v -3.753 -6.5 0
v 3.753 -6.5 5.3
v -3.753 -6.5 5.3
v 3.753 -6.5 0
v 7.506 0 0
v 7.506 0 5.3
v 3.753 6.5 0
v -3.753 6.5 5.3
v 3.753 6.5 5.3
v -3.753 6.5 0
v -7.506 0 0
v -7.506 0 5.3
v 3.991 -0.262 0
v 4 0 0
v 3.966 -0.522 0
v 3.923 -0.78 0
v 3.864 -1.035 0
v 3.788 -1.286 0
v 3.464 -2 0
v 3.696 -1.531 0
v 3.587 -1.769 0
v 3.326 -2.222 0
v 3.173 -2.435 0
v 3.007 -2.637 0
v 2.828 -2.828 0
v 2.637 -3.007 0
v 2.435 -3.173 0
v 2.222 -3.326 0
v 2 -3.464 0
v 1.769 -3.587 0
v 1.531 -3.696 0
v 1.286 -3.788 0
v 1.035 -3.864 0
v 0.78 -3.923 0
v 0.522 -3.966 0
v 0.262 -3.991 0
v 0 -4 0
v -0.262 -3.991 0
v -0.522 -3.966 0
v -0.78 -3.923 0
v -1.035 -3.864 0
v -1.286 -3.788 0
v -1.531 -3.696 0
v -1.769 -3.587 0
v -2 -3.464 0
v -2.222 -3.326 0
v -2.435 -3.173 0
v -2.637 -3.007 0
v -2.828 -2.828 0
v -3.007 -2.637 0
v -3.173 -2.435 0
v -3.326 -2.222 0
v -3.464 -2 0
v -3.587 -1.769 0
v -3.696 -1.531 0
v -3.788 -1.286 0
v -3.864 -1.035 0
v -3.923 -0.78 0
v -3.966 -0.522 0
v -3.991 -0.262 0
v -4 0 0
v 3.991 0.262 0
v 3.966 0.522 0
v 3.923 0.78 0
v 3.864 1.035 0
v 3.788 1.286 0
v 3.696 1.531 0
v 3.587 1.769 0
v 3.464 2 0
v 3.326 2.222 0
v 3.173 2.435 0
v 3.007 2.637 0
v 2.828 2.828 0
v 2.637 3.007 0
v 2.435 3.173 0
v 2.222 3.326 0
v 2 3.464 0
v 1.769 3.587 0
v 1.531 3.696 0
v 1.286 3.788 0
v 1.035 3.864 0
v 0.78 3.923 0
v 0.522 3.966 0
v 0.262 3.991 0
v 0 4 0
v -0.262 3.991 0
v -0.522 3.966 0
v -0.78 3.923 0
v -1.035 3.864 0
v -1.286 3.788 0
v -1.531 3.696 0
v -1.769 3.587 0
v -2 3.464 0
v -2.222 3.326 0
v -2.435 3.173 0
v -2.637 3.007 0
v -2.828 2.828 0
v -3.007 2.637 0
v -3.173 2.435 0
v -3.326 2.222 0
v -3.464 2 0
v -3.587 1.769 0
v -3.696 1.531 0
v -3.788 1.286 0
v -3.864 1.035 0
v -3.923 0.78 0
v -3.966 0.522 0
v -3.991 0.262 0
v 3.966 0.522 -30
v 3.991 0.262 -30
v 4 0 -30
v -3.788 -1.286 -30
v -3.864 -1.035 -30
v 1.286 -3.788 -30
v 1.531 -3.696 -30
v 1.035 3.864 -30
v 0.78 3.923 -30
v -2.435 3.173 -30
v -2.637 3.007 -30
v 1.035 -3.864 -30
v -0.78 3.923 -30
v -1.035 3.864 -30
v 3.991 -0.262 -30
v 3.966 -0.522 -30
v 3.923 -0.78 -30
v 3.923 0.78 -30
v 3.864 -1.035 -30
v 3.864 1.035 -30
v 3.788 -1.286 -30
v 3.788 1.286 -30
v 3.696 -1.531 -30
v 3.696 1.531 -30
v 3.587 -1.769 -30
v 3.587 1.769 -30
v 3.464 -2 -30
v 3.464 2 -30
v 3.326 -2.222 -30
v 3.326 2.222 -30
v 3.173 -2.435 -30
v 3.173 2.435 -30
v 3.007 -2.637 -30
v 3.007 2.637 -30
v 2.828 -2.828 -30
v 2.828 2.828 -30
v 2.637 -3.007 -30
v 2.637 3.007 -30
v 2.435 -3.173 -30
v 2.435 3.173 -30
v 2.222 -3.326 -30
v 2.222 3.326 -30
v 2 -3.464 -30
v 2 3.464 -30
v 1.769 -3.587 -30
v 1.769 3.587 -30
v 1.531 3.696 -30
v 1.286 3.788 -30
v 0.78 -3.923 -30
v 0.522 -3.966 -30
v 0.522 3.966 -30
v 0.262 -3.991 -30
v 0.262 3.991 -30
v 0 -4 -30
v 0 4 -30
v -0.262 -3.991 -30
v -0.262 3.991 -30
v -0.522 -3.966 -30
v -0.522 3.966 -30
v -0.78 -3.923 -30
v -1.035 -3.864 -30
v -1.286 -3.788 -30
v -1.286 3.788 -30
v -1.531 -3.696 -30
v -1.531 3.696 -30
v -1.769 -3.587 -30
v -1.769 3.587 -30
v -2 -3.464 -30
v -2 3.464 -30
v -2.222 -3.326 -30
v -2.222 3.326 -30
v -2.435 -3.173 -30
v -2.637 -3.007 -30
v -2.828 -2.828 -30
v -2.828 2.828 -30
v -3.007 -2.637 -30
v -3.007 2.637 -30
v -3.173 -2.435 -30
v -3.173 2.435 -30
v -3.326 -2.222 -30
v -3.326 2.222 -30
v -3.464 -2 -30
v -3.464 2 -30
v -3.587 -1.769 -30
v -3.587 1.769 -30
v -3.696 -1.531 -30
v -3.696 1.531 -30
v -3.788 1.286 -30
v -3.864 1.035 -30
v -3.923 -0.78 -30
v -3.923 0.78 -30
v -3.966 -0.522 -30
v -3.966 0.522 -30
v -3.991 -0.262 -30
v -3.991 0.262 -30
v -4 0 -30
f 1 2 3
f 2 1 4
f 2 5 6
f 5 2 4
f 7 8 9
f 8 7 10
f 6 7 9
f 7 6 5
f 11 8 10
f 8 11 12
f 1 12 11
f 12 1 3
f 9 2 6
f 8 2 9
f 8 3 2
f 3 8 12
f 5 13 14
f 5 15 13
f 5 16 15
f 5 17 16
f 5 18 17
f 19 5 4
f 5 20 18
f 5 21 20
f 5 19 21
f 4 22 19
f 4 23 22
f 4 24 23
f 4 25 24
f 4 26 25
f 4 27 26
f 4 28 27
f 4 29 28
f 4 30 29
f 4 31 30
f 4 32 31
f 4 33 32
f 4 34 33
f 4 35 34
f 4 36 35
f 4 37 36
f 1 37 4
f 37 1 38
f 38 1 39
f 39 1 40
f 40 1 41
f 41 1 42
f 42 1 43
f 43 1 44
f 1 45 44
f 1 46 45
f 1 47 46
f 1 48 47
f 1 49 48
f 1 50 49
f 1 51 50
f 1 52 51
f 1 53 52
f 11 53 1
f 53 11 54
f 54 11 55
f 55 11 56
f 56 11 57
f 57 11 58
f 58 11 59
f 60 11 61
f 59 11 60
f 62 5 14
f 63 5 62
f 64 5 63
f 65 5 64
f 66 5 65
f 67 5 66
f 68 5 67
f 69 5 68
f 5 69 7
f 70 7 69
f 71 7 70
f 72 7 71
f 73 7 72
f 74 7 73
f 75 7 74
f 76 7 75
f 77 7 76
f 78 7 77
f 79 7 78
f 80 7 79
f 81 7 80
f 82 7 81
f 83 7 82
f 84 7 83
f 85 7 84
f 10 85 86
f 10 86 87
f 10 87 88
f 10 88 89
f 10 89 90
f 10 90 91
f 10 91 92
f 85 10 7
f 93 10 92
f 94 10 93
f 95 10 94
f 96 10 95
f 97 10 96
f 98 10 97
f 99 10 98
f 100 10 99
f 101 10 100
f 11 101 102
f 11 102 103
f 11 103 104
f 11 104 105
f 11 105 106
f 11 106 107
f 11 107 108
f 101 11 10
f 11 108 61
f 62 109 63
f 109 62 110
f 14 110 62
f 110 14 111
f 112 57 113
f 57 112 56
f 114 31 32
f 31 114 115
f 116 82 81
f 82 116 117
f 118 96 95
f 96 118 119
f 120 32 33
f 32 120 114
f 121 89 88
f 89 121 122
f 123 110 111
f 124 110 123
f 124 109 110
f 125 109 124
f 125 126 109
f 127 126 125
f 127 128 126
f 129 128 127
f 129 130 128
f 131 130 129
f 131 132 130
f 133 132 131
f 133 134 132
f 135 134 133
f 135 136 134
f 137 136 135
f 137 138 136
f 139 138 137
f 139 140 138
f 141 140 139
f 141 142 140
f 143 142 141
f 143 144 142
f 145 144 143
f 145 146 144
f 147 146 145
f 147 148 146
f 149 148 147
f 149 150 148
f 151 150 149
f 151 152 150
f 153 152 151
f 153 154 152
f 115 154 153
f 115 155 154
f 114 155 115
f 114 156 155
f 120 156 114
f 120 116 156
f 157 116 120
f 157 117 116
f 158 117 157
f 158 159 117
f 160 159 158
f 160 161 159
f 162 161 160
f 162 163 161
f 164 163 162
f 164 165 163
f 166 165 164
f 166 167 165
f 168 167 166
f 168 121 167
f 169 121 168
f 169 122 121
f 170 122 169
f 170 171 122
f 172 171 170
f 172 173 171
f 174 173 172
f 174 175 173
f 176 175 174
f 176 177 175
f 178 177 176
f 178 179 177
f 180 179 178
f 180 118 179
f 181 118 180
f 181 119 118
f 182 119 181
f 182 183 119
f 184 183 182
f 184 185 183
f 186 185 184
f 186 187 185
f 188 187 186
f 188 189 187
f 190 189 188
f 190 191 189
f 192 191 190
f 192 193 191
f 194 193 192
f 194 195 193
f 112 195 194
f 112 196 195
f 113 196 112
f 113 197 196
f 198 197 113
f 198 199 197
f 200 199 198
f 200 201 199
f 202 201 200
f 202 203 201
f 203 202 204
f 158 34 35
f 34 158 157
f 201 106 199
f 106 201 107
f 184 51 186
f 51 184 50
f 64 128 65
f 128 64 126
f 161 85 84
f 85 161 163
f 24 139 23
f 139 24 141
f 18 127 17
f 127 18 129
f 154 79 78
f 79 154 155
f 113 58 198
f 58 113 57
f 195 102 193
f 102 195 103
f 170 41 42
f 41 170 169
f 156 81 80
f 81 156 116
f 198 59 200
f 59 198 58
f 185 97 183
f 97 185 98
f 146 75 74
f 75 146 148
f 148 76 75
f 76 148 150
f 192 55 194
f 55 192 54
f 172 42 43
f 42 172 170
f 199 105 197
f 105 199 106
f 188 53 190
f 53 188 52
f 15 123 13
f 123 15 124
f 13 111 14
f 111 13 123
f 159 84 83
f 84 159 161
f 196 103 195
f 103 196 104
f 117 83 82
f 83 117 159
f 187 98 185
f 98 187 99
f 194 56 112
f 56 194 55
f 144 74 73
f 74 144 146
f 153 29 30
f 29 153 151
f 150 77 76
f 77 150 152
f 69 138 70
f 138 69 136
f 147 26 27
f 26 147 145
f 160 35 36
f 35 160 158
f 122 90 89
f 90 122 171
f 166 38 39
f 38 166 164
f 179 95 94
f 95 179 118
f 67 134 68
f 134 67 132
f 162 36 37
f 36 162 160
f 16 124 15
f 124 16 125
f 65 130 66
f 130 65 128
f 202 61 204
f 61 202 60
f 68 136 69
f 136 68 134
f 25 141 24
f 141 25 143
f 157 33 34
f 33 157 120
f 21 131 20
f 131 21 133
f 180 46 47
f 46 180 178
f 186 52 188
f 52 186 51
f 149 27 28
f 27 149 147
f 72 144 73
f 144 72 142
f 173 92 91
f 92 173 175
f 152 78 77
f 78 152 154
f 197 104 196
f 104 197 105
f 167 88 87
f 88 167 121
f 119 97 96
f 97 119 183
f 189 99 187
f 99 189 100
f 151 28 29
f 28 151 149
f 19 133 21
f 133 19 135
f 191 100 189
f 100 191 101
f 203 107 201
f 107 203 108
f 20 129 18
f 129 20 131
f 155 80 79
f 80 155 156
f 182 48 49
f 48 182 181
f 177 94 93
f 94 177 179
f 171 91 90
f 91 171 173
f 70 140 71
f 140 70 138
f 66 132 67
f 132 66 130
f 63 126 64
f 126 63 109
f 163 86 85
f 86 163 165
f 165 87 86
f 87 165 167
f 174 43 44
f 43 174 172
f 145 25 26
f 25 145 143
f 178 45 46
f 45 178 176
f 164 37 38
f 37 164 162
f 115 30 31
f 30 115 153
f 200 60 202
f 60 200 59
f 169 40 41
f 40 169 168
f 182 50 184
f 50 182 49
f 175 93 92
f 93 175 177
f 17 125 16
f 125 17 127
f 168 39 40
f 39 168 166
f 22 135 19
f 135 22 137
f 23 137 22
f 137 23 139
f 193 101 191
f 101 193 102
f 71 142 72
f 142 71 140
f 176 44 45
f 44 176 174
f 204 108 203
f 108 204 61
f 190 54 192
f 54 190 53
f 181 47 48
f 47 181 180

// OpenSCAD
$fn = 96;

module hex_head(af = 13, h = 5.3) {
    r = af / (2 * cos(30));
    cylinder(h = h, r = r, $fn = 6);
}

module shank(d = 8, l = 30) {
    translate([0, 0, -l])
        cylinder(h = l, d = d);
}

union() {
    hex_head(af = 13, h = 5.3);
    shank(d = 8, l = 30);
}
